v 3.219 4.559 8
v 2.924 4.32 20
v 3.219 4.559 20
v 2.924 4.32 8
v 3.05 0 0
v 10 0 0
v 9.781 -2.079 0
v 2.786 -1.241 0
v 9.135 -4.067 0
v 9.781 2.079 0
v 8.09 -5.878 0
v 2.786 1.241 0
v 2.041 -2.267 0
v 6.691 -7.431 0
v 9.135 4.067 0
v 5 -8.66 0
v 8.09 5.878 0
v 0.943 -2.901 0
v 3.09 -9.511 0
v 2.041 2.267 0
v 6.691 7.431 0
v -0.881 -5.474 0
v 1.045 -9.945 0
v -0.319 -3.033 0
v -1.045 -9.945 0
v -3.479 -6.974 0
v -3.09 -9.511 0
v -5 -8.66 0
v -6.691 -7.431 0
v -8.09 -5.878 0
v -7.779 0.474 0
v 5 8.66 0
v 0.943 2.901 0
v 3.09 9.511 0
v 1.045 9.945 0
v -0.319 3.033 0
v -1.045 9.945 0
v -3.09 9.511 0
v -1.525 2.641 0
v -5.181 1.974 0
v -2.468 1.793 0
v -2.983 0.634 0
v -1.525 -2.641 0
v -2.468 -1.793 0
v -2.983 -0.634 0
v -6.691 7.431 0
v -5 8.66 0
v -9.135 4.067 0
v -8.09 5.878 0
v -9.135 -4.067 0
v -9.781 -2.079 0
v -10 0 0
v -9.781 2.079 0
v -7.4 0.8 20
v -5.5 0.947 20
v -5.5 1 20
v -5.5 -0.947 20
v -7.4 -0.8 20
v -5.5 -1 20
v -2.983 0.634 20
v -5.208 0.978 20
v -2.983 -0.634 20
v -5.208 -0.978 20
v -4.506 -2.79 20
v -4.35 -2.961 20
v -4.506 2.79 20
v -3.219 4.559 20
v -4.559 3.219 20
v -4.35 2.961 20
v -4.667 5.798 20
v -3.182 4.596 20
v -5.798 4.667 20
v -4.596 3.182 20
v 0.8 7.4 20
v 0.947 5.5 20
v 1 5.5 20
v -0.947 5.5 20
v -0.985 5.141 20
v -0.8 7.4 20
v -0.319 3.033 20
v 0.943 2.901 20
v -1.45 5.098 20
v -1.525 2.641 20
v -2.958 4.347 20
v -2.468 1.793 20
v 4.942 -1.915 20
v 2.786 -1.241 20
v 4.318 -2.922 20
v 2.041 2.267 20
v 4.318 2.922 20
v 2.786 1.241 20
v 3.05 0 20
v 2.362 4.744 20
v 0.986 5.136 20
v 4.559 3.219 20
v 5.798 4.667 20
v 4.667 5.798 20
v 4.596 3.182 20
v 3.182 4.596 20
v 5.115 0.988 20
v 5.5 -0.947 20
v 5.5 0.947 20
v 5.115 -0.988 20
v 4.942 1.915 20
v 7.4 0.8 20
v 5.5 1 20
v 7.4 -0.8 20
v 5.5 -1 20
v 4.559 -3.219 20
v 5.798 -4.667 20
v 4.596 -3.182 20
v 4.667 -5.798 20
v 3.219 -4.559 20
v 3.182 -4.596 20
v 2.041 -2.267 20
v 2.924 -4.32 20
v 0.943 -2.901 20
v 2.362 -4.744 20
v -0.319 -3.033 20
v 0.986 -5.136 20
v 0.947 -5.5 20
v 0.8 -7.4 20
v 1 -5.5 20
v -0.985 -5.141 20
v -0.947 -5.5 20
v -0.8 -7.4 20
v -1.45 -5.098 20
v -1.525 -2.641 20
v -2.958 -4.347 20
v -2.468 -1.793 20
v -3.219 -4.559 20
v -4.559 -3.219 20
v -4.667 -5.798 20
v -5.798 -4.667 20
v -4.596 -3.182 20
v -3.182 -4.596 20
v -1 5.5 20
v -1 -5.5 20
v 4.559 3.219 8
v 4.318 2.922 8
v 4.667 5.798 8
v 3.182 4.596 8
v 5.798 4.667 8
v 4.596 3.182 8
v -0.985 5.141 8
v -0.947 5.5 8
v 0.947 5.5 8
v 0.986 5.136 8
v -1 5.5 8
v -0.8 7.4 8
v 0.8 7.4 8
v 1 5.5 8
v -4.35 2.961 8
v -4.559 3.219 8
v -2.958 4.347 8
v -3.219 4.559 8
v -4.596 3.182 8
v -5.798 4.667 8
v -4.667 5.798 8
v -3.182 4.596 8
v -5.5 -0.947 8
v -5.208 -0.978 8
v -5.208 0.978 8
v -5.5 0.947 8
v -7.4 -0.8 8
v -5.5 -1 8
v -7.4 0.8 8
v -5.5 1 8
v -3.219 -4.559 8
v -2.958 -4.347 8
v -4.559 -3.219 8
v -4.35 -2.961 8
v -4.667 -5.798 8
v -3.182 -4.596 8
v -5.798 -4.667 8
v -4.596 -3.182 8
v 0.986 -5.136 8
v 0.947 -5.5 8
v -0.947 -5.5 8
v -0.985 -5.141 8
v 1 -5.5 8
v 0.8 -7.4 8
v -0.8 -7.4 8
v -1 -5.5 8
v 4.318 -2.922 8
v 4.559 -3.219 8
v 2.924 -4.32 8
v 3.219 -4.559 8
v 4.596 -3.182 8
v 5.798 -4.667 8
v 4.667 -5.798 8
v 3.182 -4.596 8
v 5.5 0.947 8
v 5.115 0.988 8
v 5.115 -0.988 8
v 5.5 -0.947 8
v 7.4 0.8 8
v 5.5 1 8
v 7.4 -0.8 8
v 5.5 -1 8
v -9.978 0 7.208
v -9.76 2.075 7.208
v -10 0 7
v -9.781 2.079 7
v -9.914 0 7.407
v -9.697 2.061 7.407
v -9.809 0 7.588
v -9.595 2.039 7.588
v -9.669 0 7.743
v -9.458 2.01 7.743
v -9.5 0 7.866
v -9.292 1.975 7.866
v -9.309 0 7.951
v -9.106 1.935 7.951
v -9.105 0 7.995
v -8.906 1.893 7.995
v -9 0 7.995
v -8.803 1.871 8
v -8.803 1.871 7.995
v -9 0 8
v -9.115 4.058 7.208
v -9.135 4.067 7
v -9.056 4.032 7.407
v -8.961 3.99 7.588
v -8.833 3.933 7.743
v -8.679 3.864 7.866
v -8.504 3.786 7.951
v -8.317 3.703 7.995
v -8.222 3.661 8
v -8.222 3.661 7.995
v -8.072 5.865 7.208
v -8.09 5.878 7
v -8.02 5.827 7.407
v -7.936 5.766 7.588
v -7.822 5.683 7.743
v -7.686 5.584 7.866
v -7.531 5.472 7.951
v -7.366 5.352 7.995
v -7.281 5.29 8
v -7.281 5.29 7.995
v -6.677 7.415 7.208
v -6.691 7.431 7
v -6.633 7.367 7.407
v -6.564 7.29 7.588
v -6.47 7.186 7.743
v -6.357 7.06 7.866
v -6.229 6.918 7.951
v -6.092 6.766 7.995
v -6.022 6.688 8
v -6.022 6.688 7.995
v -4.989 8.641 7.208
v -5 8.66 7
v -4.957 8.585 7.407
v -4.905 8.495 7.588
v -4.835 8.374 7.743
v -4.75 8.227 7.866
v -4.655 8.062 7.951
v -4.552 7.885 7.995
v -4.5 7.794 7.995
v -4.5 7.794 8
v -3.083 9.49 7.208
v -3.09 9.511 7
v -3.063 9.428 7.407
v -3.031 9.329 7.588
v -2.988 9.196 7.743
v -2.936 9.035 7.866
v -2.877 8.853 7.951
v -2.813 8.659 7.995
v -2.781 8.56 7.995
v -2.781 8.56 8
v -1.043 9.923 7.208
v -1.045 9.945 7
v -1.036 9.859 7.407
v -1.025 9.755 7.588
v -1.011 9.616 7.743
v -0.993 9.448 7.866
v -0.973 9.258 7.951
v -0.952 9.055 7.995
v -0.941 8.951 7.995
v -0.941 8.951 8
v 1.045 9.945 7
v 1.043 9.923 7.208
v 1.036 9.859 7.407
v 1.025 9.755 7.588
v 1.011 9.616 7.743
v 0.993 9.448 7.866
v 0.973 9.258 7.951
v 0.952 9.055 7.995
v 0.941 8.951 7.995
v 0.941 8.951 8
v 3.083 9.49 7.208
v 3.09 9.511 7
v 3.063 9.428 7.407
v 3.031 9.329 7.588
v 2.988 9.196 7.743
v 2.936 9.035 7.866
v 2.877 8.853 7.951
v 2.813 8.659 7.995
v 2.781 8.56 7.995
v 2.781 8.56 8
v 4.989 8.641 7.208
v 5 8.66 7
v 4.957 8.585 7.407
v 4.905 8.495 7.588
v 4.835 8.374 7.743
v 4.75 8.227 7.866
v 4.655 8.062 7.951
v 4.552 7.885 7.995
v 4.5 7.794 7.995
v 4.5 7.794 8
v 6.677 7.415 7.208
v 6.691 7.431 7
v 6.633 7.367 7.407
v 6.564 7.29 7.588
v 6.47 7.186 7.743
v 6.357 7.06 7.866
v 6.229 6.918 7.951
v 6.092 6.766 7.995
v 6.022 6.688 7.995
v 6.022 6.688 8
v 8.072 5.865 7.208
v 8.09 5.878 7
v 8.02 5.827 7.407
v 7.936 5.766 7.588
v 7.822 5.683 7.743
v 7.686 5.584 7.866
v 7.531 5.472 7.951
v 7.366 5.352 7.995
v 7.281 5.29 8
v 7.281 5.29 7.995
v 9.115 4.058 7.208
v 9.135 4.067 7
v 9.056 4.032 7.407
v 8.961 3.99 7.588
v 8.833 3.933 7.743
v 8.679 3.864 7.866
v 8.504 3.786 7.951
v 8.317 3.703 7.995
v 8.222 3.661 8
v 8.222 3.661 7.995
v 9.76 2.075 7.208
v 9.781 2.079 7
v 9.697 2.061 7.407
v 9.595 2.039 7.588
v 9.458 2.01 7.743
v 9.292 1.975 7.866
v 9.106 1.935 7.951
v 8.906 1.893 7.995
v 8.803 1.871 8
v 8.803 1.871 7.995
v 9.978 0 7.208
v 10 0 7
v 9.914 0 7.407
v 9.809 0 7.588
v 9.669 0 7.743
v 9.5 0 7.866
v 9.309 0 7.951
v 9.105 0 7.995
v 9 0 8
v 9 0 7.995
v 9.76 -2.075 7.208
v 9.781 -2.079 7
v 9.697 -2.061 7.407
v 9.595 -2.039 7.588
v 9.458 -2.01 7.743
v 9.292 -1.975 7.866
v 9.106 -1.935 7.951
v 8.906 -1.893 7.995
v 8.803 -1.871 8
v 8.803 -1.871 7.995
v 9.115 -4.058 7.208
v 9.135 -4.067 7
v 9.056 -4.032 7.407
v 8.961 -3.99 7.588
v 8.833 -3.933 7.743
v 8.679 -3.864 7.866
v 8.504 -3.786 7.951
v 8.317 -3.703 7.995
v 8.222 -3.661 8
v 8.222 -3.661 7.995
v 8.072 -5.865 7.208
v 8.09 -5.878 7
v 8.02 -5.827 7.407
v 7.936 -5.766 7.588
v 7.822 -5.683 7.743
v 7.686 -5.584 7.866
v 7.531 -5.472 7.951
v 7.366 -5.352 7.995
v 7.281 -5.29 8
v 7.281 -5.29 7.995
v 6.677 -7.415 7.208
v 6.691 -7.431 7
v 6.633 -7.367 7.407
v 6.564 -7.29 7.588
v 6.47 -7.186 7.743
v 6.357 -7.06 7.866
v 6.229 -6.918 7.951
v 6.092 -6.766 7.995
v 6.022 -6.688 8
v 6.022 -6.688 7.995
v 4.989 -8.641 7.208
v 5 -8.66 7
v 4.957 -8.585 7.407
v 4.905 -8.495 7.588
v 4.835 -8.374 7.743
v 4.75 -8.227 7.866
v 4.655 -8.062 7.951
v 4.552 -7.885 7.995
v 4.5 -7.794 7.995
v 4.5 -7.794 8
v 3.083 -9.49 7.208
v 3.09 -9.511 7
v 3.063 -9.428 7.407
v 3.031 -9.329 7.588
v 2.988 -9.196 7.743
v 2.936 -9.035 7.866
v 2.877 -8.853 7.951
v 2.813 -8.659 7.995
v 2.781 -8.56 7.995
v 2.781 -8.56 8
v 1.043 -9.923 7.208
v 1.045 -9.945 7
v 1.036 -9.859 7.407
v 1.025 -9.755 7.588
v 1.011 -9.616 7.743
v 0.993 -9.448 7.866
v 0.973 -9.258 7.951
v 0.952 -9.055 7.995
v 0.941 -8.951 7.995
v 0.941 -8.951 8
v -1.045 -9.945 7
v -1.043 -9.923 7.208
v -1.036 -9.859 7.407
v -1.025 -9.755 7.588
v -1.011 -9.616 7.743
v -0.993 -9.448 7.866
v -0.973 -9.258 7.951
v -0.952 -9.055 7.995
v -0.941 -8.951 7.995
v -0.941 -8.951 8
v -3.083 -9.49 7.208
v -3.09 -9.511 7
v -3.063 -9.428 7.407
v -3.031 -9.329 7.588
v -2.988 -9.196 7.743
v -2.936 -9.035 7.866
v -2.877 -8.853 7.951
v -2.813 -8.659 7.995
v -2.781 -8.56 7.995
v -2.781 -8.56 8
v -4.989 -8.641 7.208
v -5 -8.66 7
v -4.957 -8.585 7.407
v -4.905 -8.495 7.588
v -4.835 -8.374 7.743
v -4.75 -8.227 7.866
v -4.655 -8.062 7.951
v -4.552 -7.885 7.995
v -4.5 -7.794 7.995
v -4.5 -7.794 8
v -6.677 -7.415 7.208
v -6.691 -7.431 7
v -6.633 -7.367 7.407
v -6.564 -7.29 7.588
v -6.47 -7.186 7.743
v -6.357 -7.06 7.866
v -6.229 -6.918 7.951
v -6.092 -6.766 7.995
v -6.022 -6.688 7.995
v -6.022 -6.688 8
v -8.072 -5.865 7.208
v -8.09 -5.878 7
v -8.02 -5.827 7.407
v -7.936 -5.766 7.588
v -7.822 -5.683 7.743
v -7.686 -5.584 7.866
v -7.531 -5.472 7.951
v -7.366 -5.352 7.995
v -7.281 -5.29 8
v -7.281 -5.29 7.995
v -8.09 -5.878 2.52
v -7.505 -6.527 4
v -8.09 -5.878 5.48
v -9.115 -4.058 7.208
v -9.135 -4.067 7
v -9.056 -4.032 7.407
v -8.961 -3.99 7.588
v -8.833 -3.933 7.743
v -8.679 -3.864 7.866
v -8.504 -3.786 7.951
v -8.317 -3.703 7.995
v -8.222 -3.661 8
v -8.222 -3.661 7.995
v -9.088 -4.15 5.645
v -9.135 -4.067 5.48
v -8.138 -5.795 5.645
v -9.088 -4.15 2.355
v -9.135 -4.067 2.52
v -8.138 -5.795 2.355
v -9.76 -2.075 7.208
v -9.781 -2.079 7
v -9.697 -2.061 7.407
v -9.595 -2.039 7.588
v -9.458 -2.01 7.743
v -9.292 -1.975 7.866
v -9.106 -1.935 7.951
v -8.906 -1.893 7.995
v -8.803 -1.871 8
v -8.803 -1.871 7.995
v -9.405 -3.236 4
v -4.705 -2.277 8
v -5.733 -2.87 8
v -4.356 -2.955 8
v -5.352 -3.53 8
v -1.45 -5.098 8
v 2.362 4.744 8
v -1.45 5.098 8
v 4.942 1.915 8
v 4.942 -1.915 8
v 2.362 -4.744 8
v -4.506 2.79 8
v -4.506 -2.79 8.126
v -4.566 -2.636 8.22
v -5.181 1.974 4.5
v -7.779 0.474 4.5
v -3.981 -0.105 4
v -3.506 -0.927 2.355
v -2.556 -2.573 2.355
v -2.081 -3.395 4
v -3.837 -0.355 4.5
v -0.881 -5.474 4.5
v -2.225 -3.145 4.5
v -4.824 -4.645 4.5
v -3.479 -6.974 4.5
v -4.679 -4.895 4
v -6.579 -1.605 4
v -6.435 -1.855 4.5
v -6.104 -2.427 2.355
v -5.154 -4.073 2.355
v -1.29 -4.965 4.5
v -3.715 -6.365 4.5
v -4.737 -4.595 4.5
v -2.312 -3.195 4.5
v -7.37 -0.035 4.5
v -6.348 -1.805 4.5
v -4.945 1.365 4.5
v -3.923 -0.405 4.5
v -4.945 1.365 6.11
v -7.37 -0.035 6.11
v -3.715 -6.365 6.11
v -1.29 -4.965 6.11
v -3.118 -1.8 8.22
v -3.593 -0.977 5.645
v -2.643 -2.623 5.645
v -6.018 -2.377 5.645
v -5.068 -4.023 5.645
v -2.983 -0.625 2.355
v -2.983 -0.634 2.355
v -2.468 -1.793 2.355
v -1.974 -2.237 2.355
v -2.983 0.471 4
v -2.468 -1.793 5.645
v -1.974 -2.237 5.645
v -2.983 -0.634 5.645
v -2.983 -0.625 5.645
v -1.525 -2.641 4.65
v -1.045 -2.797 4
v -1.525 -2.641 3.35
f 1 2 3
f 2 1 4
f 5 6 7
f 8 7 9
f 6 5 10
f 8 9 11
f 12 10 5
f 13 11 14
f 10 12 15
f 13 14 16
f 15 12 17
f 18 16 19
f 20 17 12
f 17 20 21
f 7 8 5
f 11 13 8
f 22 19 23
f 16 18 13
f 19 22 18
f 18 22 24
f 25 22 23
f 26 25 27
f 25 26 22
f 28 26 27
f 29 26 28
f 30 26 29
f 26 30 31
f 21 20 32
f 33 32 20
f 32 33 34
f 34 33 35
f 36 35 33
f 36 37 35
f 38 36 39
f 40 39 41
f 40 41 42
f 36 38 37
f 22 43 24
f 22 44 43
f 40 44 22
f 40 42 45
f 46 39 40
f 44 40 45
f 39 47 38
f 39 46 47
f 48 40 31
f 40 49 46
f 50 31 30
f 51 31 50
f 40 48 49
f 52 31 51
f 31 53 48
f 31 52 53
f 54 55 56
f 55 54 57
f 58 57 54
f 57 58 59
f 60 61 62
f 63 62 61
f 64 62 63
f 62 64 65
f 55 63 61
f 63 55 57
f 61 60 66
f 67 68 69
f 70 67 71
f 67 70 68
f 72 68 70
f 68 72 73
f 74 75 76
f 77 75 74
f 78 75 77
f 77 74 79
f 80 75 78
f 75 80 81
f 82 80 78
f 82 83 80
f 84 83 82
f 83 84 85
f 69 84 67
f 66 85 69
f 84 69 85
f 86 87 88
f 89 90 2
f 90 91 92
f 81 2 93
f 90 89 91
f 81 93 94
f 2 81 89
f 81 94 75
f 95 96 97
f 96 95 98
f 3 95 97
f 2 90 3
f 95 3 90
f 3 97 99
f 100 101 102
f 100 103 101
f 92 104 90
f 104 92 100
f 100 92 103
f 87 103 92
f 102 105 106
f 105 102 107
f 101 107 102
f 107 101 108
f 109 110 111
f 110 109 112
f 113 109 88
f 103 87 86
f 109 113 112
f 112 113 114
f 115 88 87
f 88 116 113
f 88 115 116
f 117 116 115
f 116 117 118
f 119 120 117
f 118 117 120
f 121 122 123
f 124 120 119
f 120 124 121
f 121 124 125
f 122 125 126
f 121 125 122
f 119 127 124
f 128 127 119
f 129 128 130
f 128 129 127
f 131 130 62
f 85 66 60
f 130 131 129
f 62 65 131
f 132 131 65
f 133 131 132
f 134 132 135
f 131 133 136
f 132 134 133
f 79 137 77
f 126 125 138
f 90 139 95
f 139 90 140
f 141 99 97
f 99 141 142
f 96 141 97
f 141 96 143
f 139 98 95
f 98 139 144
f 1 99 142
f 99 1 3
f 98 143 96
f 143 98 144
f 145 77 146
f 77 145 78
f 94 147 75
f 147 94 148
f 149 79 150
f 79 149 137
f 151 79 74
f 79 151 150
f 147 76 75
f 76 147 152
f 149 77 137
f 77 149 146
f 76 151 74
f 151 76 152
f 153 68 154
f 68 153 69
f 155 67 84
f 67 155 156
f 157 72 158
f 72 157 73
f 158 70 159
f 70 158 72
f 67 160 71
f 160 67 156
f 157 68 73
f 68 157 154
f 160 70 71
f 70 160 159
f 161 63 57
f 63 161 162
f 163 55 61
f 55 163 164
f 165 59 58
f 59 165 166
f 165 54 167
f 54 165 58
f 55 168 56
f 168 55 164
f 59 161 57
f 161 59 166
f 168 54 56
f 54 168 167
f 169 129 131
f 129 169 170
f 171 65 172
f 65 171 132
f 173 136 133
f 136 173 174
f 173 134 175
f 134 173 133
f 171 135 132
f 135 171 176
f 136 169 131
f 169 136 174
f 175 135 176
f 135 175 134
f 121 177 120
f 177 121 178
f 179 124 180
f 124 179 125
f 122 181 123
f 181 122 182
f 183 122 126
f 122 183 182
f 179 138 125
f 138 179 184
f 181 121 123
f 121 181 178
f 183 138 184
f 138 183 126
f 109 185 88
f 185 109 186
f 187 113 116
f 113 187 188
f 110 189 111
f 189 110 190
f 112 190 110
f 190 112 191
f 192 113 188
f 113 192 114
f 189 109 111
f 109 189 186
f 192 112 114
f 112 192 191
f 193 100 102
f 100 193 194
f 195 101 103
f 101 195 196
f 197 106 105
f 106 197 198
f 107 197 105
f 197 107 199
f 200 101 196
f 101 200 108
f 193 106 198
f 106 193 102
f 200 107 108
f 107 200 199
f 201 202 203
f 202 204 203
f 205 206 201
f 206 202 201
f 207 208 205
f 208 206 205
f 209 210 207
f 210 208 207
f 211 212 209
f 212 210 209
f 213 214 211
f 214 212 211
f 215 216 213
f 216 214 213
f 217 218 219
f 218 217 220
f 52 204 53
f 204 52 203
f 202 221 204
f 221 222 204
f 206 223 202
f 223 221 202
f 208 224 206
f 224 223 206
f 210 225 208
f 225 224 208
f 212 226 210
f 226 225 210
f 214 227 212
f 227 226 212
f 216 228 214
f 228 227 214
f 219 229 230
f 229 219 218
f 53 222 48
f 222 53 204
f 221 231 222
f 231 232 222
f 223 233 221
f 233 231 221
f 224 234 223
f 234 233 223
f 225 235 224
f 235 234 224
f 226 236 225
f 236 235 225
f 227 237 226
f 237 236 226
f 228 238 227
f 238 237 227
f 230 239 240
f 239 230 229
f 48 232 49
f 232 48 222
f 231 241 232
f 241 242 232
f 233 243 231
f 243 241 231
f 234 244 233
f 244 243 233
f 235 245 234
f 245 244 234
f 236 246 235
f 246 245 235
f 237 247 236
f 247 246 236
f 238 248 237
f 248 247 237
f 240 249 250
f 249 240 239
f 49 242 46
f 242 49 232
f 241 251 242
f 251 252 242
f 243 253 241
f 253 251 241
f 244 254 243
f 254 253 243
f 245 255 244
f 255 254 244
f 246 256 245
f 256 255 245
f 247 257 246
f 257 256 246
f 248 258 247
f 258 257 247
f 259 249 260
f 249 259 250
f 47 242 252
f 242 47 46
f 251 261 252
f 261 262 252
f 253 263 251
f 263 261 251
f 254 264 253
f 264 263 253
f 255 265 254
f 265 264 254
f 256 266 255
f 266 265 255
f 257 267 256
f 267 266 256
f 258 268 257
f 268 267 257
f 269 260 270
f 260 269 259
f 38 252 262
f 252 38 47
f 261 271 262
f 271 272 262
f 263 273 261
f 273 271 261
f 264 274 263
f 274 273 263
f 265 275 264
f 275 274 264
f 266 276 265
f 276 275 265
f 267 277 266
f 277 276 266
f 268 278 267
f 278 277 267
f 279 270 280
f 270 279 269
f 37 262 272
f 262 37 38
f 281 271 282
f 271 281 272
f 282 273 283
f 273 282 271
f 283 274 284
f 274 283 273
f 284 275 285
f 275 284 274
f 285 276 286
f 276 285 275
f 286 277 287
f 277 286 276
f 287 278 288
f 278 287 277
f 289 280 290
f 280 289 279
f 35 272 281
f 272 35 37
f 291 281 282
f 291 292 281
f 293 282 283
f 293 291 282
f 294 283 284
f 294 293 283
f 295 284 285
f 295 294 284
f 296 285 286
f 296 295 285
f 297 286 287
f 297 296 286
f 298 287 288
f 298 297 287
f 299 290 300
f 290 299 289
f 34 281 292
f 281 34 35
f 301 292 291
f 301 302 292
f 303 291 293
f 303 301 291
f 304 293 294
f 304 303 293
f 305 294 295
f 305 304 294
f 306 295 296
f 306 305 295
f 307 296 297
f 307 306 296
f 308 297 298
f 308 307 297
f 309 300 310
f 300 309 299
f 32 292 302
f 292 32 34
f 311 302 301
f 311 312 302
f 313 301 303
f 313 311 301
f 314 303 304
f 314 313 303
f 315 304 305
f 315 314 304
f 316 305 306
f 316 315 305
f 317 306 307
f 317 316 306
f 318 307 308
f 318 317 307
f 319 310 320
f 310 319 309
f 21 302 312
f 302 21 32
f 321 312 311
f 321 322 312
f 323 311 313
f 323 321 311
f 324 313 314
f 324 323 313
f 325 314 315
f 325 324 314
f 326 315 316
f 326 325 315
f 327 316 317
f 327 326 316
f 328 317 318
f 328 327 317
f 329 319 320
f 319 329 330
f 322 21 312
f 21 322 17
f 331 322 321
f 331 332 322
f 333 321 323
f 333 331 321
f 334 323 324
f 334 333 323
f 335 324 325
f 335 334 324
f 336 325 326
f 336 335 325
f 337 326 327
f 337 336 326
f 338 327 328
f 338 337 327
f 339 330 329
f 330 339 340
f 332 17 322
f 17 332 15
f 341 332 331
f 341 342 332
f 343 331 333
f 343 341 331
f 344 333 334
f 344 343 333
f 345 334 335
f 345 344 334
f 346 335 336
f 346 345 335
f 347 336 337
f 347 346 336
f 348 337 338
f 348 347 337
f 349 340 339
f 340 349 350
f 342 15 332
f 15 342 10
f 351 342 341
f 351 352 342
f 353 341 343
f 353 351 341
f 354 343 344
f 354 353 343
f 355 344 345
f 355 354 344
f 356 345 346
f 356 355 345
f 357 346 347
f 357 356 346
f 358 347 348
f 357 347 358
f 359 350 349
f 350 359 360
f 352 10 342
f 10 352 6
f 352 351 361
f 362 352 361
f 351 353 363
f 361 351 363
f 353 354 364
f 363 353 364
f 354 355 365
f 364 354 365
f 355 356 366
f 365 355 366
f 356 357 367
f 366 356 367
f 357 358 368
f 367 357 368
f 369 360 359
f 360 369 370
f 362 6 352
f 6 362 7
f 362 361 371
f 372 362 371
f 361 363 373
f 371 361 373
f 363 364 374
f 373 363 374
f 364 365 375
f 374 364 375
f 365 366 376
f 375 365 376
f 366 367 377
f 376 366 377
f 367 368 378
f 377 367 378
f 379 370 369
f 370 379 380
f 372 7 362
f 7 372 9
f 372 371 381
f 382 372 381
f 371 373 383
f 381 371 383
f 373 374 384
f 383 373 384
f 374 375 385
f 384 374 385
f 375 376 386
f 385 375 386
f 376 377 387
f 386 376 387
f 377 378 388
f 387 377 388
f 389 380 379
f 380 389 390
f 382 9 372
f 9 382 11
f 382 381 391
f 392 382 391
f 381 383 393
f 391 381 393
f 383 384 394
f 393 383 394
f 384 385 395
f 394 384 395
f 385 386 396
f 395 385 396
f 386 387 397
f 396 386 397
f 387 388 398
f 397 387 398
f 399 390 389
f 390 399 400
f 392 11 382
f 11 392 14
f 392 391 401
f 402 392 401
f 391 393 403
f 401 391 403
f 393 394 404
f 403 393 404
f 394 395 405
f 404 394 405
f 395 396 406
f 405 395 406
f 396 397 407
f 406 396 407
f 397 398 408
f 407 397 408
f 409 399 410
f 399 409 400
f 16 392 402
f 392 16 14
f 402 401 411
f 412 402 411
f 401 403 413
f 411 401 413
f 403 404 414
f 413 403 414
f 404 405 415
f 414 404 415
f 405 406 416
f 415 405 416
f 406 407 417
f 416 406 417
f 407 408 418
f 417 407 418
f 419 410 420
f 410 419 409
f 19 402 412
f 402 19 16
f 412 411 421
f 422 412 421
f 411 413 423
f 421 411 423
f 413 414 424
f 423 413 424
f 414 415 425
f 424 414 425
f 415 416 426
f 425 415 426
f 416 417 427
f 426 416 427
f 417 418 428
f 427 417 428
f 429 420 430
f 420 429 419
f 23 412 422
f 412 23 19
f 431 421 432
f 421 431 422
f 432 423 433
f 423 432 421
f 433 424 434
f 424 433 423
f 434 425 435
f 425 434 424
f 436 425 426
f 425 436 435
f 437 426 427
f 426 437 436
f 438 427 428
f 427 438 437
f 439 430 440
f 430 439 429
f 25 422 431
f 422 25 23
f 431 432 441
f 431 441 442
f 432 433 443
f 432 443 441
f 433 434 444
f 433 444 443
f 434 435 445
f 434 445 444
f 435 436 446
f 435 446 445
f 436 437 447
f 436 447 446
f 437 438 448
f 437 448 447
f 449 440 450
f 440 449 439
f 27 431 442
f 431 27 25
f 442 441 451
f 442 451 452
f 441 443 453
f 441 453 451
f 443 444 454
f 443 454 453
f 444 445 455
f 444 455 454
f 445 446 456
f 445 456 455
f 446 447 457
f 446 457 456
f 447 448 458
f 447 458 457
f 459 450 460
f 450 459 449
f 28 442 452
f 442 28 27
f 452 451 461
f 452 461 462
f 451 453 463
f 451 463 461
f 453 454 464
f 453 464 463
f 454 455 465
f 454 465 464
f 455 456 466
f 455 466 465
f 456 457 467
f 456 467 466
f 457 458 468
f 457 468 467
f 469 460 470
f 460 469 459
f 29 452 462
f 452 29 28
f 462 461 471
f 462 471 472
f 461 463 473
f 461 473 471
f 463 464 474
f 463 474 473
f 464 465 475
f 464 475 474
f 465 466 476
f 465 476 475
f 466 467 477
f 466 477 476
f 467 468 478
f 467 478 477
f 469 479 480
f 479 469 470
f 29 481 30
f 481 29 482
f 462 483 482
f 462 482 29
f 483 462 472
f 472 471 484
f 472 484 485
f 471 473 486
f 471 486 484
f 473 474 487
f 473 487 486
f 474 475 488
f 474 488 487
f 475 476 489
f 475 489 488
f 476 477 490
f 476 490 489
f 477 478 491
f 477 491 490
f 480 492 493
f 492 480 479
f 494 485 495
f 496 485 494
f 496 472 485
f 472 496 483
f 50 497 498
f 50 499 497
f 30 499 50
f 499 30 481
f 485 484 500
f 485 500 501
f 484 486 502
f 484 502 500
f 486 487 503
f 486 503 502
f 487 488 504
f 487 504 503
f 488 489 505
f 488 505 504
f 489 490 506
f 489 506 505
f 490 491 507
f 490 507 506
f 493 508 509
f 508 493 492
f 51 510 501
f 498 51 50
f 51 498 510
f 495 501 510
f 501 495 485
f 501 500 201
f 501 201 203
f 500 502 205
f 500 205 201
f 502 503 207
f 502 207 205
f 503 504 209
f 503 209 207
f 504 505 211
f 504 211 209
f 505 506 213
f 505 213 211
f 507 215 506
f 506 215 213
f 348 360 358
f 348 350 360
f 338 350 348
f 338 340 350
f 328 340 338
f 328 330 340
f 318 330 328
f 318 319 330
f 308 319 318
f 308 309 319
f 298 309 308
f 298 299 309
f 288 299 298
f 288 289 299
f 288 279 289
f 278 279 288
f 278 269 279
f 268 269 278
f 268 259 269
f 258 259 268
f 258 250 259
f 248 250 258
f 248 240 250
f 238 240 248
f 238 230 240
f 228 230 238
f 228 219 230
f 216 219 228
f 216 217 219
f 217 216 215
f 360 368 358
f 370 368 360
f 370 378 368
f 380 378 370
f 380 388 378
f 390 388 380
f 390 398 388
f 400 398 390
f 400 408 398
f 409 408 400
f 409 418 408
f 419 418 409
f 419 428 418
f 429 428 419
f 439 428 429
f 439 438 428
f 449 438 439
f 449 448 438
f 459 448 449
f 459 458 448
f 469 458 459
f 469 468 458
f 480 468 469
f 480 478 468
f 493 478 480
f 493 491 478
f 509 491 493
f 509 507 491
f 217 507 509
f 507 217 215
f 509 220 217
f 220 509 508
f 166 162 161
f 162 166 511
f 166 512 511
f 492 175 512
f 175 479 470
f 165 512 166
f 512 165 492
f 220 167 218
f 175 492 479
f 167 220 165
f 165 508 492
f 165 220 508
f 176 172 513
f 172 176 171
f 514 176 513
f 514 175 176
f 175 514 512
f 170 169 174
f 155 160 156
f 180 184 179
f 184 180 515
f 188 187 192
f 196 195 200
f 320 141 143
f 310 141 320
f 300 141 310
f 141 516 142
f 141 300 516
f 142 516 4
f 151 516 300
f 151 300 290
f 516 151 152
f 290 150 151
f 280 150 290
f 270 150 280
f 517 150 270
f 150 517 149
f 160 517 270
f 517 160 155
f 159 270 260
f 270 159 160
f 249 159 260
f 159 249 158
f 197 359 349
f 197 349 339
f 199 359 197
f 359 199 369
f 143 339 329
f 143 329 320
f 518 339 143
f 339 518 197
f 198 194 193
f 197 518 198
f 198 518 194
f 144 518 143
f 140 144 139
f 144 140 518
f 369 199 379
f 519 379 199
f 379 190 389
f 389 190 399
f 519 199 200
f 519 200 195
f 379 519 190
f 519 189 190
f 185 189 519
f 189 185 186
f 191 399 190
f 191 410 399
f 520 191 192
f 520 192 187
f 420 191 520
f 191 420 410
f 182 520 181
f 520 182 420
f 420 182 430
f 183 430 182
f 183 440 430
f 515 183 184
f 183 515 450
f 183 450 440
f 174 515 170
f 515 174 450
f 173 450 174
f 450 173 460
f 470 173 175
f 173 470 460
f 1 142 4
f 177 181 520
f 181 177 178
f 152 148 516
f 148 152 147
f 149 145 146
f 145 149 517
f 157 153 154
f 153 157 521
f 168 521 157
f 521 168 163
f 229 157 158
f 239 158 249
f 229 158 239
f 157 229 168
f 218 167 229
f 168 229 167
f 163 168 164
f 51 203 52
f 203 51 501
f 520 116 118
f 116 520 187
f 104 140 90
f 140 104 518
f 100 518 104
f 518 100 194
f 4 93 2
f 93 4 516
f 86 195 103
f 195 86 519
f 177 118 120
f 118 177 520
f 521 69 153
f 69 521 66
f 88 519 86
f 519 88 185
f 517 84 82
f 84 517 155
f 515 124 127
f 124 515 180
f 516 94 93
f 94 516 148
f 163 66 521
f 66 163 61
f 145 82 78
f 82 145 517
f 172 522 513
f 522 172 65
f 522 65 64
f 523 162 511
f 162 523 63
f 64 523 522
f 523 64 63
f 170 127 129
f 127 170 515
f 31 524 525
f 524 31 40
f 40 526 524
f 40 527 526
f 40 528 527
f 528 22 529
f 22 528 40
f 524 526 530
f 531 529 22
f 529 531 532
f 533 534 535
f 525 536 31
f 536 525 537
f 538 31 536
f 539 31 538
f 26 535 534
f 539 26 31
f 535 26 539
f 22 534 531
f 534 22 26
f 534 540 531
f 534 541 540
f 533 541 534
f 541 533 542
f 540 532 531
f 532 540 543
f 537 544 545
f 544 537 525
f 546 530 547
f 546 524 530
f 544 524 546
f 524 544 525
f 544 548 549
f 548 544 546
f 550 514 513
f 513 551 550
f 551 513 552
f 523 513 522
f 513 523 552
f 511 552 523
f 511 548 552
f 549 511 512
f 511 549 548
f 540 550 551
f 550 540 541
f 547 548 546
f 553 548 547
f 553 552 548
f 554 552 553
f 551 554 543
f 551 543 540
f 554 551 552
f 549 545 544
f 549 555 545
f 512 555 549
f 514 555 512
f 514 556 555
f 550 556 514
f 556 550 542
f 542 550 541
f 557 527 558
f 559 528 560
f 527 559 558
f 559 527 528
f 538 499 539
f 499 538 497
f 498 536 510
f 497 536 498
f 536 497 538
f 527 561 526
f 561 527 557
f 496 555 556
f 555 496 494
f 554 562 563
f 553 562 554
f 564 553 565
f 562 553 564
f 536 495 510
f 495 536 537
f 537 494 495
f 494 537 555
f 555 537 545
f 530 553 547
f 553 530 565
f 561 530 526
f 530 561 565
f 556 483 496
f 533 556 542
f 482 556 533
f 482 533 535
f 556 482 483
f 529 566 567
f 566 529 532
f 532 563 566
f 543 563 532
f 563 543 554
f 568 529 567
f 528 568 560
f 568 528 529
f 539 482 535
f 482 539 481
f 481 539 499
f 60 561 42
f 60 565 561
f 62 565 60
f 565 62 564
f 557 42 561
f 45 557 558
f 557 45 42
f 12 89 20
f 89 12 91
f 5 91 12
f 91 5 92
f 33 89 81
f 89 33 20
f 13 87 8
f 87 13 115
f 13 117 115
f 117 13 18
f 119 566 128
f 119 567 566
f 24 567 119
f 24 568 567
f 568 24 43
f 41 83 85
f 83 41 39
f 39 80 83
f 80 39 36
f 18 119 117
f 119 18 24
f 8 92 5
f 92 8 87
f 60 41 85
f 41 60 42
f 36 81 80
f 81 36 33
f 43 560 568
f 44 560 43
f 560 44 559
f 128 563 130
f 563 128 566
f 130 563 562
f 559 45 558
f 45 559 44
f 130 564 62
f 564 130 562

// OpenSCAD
// file: configuration.scad
// PRUSA Mendel  
// Configuration file
// GNU GPL v2
// Josef Průša
// josefprusa@me.com
// prusadjs.cz
// http://www.reprap.org/wiki/Prusa_Mendel
// http://github.com/prusajr/PrusaMendel

// PLEASE SELECT ONE OF THE CONFIGURATIONS BELOW
// BY UN-COMMENTING IT

variant=0; //0 for metric
//variant=1; //1 for SAE
if(variant==0){
echo("variant: metric");
}else if(variant==1){
echo("variant: sae");
} else{
echo("WARNING: INVALID CONFIGURATION");
}


vars=[
//[m8_dia, m8_nut, m4_dia, m4_nut, m3_dia, m3_nut, bush_dia, mot_shaft, bush_rod, bush_outerdia, bush_length]
[8.4,16.4,5,9,4.4,7,11,5.3,8,16,11],//metric
[9,16.4,5.5,10,5.5,10,11.5,5.3,7.9375,16,11]//SAE
];

//BUSHING TYPE Can generate three versions
// 1 - regular old ones
// 2 - helical ones
// 3 - holders for brass or any other bought bushings
bushing_type = 2;

//Round corner diameter
round_corner_diameter = 8;

//Thin wall size
layer_height = 0.4;
perimeter_width_over_thicknes = 1.6;
infill_widht_over_thickness = 1.55;
thin_wall = 2*(perimeter_width_over_thicknes*layer_height+infill_widht_over_thickness*layer_height);
if(thin_wall<2){
	echo("Check thin wall size, its below 2mm!");
}
echo(thin_wall);

//DO NOT TOUCH THIS SECTION!
m8_diameter = vars[variant][0];
m8_nut_diameter = vars[variant][1];
m4_diameter = vars[variant][2];
m4_nut_diameter = vars[variant][3];
m3_diameter = vars[variant][4];
m3_nut_diameter = vars[variant][5];
bushing_diameter = vars[variant][6];
motor_shaft=vars[variant][7];
bushing_rodsize = vars[variant][8];
bushing_outerDiameter = vars[variant][9];
bushing_lenght = vars[variant][10];


// MINI-HUXLEY VERSION (TODO, just place holder)
// include <configuration-huxley.scad>

// MEGA VERSION (TODO, just place holder)
// include <configuration-mega.scad>


// Some basic functions, probably should be somewhere else
module roundcorner(diameter){
	difference(){
		cube(size = [diameter,diameter,99], center = false);
		translate(v = [diameter, diameter, 0]) cylinder(h = 100, r=diameter, center=true);
	}
}
// main file
// Belt pulley is http://www.thingiverse.com/thing:3104 by GilesBathgate
// GPLV3

include <configuration.scad>

module pulley()
{


	module spur()
	{
	linear_extrude(height=20) polygon([[-1,-1],[-1,1],[0.9,0.8],[0.9,-0.8]],[[0,1,2,3,0]]);
	}
	
 difference()
 {	 
 	union()
 	{
 		//base
 		rotate_extrude($fn=30)
 		{
 				square([9,8]);
 				square([10,7]);
 				translate([9,7]) circle(1);
 		}
    	
    	//shaft
    	cylinder(r=motor_shaft,h=20);
    	
    	//spurs
    	for(i=[1:8]) rotate([0,0,i*(360/8)]){
    	translate([6,0,0])spur();
	translate([6.5,0,0])spur();
	}
   }
   
   //shaft hole
    translate([0,0,-1])cylinder(r=motor_shaft/2+0.4,h=22,$fn=15);
    		
    //captive nut and grub holes
    for(j=[1:1]) rotate([0,0,j*(360/3)])
	translate([0,20,4])rotate([90,0,0])
	union()
	{
		//entrance
		translate([0,-3,15]) cube([8.6,7,3],center=true);
		//nut
		translate([0,0,13.6]) rotate([0,0,30])cylinder(r=4.22,h=2.8,$fn=6);
		//grub hole
		translate([0,0,9]) cylinder(r=1.9,h=10);
	}

 }

   
}

pulley();
